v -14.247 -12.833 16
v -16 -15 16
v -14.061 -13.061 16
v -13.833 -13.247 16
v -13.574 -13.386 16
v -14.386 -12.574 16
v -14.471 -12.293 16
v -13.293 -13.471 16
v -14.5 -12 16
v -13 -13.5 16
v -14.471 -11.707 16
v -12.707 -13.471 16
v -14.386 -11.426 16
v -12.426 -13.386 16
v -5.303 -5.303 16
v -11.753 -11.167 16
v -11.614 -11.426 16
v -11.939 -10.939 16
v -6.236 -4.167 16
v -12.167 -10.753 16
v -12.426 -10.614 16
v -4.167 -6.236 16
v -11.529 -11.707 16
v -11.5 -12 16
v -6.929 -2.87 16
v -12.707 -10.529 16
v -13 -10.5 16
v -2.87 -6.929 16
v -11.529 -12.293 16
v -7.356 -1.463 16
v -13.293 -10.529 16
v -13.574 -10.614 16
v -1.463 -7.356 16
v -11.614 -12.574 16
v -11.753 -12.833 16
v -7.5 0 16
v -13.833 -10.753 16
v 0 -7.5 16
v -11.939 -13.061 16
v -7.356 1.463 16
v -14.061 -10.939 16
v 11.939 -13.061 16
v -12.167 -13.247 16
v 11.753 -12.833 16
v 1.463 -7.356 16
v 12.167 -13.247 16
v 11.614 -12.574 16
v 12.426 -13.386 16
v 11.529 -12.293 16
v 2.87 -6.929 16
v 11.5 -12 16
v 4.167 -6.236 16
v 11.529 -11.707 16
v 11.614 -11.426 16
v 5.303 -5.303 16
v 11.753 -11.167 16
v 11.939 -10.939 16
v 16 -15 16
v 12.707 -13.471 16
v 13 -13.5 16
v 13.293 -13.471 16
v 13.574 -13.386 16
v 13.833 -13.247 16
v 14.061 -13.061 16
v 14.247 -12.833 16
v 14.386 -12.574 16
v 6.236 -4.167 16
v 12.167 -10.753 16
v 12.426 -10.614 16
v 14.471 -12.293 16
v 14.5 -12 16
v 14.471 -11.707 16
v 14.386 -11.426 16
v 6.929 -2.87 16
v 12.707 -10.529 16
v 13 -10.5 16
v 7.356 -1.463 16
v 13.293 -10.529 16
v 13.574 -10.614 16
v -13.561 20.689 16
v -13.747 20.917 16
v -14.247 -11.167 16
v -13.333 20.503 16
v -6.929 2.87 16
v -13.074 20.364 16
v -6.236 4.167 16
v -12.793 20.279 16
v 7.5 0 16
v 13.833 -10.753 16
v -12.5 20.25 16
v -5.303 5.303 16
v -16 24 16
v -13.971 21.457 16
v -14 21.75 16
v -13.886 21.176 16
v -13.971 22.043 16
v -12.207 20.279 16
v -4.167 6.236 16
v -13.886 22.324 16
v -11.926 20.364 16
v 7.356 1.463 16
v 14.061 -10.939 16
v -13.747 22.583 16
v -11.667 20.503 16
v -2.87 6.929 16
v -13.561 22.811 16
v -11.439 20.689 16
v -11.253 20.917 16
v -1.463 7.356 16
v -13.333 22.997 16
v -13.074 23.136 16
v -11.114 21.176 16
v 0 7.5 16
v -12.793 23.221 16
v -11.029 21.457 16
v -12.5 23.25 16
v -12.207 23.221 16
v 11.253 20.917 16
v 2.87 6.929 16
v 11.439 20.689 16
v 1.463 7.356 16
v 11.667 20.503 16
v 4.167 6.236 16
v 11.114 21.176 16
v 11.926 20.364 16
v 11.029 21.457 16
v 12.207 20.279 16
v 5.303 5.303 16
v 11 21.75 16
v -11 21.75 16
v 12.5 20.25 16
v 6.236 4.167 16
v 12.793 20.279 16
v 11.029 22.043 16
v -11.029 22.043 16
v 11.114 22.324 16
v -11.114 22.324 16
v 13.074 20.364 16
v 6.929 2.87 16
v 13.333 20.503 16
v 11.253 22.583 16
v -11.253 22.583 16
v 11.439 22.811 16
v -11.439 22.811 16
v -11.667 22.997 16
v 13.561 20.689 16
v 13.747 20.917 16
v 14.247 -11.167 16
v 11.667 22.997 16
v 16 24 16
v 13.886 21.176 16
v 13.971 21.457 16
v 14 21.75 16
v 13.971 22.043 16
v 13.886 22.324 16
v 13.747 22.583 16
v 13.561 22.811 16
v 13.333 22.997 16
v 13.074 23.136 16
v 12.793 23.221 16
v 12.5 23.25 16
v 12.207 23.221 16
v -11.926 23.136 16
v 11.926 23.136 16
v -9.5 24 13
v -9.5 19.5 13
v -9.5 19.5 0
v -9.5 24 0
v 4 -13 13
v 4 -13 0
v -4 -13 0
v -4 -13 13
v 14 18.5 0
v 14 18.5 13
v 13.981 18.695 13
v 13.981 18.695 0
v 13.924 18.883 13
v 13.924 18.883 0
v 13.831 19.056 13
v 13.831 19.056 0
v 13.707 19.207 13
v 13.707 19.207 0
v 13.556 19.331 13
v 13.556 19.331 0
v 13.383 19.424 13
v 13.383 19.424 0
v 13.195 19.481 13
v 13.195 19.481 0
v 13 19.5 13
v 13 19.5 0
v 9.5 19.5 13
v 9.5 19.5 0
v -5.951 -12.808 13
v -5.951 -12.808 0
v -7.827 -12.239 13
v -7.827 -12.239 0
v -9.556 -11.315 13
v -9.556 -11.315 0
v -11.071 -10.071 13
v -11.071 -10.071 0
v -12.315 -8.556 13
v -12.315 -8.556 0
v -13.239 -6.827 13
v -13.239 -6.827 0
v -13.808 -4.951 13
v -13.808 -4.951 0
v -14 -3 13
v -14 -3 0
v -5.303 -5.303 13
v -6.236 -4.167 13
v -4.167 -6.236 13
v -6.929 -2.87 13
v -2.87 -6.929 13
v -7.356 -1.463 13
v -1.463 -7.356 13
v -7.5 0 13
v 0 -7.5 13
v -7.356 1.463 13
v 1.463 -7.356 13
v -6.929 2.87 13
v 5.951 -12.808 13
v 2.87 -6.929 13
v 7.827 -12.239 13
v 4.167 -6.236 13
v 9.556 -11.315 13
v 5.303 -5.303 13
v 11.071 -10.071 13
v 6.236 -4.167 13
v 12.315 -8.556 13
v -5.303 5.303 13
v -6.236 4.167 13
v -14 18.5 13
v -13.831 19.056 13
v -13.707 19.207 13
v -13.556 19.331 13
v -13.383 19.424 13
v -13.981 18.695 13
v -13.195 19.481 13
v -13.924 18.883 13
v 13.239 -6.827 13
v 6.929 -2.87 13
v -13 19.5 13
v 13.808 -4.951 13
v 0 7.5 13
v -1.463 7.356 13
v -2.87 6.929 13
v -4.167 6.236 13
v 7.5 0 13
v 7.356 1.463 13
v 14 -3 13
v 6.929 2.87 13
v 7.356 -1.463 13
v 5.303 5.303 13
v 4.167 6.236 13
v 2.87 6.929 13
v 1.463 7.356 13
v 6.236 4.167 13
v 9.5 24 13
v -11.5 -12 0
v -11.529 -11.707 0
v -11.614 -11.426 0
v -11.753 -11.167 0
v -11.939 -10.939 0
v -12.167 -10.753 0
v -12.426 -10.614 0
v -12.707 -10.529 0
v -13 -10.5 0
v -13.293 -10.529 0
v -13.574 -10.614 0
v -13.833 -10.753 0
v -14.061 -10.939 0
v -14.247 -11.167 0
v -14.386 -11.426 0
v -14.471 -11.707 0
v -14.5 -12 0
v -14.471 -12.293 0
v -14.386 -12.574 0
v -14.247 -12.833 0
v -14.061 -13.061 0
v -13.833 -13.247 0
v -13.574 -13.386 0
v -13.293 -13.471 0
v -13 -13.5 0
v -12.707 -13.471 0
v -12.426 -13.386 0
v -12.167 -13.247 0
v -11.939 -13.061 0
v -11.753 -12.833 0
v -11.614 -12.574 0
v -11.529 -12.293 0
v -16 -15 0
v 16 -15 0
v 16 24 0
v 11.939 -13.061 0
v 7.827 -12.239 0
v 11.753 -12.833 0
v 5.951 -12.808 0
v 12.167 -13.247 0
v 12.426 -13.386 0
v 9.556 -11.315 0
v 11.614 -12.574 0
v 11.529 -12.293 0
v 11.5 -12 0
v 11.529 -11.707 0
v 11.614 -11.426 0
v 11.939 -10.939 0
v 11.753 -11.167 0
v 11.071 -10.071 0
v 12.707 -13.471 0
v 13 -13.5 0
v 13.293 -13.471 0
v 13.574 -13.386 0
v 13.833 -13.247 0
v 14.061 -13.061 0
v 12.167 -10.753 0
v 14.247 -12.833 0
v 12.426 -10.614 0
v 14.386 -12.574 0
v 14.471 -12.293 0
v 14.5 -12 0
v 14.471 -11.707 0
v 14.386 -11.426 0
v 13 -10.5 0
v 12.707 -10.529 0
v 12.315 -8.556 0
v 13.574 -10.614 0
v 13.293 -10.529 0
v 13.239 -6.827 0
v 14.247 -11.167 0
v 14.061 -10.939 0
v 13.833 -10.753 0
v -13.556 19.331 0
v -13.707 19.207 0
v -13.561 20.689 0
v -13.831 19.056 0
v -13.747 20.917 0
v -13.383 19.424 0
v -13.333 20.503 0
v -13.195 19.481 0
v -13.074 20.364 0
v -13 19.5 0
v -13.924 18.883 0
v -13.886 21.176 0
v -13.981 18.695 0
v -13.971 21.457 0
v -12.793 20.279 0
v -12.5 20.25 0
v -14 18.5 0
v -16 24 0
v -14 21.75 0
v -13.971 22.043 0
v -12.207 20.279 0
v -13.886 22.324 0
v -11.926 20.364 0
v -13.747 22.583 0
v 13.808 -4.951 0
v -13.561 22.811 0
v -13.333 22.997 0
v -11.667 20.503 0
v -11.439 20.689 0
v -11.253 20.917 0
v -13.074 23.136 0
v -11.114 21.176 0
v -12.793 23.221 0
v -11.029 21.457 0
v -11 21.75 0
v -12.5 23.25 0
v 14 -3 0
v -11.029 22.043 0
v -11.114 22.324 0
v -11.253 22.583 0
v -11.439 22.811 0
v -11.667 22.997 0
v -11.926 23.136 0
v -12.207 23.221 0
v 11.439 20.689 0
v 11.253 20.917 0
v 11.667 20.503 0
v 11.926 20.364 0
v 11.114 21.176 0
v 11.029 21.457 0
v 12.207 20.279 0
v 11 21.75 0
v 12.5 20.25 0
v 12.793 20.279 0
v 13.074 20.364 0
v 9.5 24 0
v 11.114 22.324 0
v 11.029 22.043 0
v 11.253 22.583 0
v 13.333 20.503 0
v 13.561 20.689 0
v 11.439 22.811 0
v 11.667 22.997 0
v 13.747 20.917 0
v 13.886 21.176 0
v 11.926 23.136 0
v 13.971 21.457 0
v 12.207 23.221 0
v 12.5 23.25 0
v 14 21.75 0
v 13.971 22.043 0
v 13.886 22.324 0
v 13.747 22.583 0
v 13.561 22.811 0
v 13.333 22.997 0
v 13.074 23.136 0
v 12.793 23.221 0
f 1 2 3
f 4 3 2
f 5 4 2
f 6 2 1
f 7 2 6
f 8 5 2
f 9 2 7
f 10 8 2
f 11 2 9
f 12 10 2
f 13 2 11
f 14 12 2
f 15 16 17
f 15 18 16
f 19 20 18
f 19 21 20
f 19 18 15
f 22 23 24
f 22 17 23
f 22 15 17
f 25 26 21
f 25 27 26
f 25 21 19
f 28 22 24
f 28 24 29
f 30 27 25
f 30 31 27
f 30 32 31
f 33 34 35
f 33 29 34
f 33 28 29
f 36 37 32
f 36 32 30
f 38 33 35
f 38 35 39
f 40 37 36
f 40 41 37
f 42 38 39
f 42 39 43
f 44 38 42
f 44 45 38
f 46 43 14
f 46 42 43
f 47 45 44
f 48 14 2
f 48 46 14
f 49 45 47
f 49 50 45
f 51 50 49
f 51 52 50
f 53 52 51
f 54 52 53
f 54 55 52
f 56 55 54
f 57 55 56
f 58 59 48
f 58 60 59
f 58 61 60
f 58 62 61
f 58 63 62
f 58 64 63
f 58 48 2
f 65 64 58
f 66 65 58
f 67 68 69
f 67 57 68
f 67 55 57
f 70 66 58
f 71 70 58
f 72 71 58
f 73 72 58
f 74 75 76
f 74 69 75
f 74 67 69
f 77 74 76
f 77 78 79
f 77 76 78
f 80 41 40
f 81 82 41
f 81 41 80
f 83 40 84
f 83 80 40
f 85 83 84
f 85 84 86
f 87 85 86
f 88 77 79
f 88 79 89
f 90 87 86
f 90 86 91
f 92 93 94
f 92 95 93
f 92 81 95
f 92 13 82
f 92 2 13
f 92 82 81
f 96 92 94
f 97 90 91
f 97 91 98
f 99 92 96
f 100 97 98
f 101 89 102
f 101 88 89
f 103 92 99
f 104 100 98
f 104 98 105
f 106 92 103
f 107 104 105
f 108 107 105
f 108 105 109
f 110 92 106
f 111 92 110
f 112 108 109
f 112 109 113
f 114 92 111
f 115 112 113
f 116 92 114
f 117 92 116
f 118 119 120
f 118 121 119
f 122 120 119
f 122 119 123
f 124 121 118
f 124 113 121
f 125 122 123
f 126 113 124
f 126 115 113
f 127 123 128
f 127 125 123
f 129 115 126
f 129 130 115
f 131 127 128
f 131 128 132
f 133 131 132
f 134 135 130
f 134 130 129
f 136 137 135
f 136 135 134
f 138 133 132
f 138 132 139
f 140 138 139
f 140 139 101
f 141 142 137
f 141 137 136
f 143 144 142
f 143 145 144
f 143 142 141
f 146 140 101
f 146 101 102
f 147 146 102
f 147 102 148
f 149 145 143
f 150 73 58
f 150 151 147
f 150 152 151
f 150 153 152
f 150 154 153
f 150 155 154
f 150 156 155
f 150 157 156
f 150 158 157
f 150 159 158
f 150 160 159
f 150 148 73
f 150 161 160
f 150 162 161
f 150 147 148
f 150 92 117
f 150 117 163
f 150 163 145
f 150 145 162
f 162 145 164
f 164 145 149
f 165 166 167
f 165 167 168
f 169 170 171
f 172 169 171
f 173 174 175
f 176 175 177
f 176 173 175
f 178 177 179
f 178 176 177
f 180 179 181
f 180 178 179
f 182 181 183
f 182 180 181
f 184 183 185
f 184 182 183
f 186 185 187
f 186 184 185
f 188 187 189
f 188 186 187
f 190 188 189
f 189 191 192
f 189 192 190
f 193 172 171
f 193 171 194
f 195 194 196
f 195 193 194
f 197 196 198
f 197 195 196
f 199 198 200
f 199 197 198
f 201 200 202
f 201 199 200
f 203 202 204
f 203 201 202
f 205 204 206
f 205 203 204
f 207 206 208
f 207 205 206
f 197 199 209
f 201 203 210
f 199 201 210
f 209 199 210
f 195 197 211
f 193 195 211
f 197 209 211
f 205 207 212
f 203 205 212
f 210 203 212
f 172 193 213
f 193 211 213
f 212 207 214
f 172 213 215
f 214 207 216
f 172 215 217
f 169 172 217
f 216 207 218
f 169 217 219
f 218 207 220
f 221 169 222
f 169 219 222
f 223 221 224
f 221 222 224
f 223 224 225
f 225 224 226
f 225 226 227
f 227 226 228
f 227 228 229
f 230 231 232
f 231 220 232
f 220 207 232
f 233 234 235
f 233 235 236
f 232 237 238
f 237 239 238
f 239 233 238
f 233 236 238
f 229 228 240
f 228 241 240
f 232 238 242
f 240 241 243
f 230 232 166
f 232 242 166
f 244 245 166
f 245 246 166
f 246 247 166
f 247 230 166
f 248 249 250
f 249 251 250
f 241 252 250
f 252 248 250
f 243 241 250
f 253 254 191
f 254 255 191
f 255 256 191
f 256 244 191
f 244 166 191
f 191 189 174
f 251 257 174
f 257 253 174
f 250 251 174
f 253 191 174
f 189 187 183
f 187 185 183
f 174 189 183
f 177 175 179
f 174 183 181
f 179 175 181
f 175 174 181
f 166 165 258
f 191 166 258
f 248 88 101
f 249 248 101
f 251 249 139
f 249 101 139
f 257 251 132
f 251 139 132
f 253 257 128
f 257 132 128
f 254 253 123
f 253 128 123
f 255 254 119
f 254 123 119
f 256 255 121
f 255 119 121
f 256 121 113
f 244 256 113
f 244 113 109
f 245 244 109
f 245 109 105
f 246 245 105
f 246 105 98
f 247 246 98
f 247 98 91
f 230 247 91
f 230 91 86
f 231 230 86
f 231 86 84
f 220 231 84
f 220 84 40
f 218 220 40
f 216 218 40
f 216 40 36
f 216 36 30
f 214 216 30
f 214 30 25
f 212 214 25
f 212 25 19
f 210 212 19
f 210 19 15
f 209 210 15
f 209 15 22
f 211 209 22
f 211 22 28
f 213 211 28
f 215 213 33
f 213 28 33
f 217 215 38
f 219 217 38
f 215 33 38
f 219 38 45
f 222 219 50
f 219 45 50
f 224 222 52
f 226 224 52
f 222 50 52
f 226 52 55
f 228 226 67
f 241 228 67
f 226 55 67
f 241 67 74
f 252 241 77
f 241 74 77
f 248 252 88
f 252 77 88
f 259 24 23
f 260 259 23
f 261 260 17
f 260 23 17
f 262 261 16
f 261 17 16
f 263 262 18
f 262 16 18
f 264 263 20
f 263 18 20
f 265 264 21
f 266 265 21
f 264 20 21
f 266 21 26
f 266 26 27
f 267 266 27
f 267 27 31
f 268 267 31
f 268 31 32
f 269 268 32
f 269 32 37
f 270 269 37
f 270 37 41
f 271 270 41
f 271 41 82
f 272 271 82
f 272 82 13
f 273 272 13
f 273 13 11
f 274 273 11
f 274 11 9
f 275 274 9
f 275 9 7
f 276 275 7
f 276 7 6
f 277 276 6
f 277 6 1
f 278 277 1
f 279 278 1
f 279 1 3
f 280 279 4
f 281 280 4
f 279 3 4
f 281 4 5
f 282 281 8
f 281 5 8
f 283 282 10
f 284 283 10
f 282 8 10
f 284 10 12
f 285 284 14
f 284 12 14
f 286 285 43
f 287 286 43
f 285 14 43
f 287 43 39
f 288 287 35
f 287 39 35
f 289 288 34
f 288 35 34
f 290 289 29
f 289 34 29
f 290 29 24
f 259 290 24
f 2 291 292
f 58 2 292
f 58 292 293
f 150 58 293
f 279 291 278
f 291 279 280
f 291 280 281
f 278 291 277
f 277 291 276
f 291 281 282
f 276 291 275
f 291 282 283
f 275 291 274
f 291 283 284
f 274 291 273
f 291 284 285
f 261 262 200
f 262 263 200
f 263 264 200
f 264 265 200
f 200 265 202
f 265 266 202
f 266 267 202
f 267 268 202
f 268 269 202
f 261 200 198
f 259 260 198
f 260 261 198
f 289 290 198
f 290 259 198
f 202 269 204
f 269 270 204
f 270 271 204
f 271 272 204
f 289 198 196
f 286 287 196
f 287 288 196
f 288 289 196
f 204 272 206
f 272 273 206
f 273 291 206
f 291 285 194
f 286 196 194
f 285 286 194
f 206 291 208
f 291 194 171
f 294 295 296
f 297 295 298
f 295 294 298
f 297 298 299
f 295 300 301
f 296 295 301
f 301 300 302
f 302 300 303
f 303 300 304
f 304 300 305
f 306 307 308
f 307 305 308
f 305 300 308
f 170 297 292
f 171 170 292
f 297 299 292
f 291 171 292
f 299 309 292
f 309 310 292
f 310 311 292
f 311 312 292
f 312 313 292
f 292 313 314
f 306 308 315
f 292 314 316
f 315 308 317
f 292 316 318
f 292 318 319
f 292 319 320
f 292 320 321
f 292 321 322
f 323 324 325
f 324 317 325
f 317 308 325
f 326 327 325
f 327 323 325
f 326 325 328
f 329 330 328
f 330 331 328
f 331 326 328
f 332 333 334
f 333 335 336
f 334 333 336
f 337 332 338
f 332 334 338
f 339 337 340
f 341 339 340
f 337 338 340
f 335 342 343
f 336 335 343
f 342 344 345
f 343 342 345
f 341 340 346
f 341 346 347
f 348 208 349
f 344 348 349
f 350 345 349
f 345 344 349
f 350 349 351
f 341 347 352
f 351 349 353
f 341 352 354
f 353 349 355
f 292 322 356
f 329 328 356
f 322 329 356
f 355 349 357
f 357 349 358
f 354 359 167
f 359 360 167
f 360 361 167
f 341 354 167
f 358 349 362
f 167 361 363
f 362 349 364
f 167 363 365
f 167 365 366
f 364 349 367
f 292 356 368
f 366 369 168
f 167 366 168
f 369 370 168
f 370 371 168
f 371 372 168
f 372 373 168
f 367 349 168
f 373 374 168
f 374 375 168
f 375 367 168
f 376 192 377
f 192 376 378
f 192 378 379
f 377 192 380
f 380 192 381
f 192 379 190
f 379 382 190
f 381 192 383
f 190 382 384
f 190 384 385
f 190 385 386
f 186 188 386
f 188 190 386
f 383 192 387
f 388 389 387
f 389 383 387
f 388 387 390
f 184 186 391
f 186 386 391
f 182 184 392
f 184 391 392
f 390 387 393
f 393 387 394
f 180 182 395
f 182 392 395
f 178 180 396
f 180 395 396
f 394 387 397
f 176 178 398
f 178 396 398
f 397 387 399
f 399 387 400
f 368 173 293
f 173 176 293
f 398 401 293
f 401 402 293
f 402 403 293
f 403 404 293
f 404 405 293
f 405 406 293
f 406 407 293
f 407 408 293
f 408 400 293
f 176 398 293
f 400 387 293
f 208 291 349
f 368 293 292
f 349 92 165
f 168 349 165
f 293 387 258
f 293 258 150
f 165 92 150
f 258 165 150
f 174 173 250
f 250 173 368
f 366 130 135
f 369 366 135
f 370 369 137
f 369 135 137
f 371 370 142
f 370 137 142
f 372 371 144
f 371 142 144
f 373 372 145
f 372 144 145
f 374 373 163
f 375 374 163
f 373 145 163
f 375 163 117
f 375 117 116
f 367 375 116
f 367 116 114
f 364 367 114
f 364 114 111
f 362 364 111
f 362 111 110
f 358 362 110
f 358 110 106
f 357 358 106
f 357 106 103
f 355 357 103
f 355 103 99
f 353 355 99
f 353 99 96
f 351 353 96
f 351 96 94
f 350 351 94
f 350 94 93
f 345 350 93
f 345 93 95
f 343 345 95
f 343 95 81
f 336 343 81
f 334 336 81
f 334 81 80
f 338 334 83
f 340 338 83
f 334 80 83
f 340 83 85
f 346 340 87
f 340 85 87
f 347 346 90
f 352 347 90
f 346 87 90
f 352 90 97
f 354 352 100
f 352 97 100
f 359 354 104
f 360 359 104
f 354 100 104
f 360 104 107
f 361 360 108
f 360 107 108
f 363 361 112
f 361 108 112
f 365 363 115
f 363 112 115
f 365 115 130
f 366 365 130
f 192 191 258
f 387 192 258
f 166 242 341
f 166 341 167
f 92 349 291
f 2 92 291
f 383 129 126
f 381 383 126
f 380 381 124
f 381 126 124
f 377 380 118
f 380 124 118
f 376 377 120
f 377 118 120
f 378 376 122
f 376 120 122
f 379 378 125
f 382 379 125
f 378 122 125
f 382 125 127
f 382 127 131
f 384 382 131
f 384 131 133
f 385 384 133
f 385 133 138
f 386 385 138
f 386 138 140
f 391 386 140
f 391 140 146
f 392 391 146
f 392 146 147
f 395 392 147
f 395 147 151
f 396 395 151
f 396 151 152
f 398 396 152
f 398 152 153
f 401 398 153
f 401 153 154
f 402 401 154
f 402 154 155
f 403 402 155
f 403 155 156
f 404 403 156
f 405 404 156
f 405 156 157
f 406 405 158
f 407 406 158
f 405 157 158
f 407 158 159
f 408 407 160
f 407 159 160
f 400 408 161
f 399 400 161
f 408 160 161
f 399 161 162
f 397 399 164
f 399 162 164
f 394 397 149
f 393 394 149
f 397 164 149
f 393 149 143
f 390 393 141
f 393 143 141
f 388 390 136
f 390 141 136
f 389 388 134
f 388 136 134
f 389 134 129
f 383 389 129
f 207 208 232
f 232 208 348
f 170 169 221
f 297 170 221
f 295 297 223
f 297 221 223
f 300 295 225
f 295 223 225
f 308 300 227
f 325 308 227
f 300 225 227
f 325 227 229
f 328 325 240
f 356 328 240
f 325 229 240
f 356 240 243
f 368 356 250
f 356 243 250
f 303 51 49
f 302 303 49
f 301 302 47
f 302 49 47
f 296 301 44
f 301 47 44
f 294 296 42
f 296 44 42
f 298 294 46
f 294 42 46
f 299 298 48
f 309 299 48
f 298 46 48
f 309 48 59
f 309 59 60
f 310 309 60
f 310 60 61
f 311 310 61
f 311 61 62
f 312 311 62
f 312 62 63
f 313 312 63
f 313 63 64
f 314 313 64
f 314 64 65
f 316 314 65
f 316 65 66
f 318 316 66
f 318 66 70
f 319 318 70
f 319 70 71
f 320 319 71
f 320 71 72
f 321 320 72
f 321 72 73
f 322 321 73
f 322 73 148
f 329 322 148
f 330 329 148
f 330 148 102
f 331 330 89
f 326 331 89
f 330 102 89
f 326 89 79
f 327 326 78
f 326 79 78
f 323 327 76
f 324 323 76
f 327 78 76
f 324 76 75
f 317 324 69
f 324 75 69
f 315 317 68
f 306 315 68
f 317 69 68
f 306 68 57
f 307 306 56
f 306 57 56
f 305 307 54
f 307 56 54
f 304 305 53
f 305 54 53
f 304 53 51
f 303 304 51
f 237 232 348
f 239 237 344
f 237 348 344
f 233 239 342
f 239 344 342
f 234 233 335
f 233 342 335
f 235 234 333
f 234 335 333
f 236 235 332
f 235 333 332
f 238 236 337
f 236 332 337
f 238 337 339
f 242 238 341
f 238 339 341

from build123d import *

# Parameters (mm, degrees)
BOSS_EXTRUDE1_DEPTH = 19
SKETCH2_W           = 4.5
SKETCH2_H           = 4.5
BOSS_EXTRUDE2_DEPTH = 19
FILLET1_R           = 10
FILLET2_R           = 10
FILLET3_R           = 1
SKETCH3_R           = 1.5
CUT_EXTRUDE1_DEPTH  = 19
SKETCH4_W           = 32
SKETCH4_H           = 3
CUT_EXTRUDE2_DEPTH  = 47.238512087
SKETCH5_W           = 32
SKETCH5_H           = 39
SKETCH5_R           = 1.5
BOSS_EXTRUDE3_DEPTH = 3
SKETCH6_R           = 7.5
CUT_EXTRUDE3_DEPTH  = 33.984845005


with BuildPart() as part:
    # Sketch1 → Boss-Extrude1 (new body)
    with BuildSketch(Plane.XY):
        with BuildLine():
            Line((-16, 24), (-16, 0))
            ThreePointArc((-16, 0), (-15.491933385, 4), (-14, 7.745966692))
            Line((-14, 7.745966692), (-14, 22))
            Line((-14, 22), (-14, 24))
            Line((-14, 24), (-16, 24))
        make_face()
        with BuildLine():
            ThreePointArc((-14, 7.745966692), (-15.491933385, 4), (-16, 0))
            ThreePointArc((-16, 0), (-15.491933385, -4), (-14, -7.745966692))
            Line((-14, -7.745966692), (-14, 0))
            Line((-14, 0), (-14, 7.745966692))
        make_face()
        with BuildLine():
            ThreePointArc((-14, -7.745966692), (-15.491933385, -4), (-16, 0))
            Line((-16, 0), (-16, -15))
            Line((-16, -15), (-5.567764363, -15))
            ThreePointArc((-5.567764363, -15), (-7.514407784, -14.125638947), (-9.327379053, -13))
            Line((-9.327379053, -13), (-14, -13))
            Line((-14, -13), (-14, -7.745966692))
        make_face()
        with BuildLine():
            ThreePointArc((-9.327379053, -13), (-7.514407784, -14.125638947), (-5.567764363, -15))
            Line((-5.567764363, -15), (5.567764363, -15))
            ThreePointArc((5.567764363, -15), (7.514407784, -14.125638947), (9.327379053, -13))
            Line((9.327379053, -13), (5.196152423, -13))
            ThreePointArc((5.196152423, -13), (0, -14), (-5.196152423, -13))
            Line((-5.196152423, -13), (-9.327379053, -13))
        make_face()
        with BuildLine():
            Line((5.196152423, -13), (-5.196152423, -13))
            ThreePointArc((-5.196152423, -13), (0, -14), (5.196152423, -13))
        make_face()
        with BuildLine():
            ThreePointArc((9.327379053, -13), (7.514407784, -14.125638947), (5.567764363, -15))
            Line((5.567764363, -15), (16, -15))
            Line((16, -15), (16, 0))
            ThreePointArc((16, 0), (15.491933385, -4), (14, -7.745966692))
            Line((14, -7.745966692), (14, -13))
            Line((14, -13), (9.327379053, -13))
        make_face()
        with BuildLine():
            ThreePointArc((16, 0), (15.491933385, 4), (14, 7.745966692))
            Line((14, 7.745966692), (14, 0))
            Line((14, 0), (14, -7.745966692))
            ThreePointArc((14, -7.745966692), (15.491933385, -4), (16, 0))
        make_face()
        with BuildLine():
            Line((14, 22), (14, 7.745966692))
            ThreePointArc((14, 7.745966692), (15.491933385, 4), (16, 0))
            Line((16, 0), (16, 24))
            Line((16, 24), (14, 24))
            Line((14, 24), (14, 22))
        make_face()
    extrude(amount=BOSS_EXTRUDE1_DEPTH)

    # Sketch2 → Boss-Extrude2 (add)
    with BuildSketch(Plane.XY.offset(19)):
        with Locations((-11.75, 21.75)):
            Rectangle(SKETCH2_W, SKETCH2_H)
        with Locations((11.75, 21.75)):
            Rectangle(SKETCH2_W, SKETCH2_H)
    extrude(amount=-BOSS_EXTRUDE2_DEPTH)

    # Fillet1
    fillet1_edges = [part.edges().sort_by_distance(p)[0] for p in [
        (-14, -13, 9.5),
    ]]
    fillet(fillet1_edges, radius=FILLET1_R)

    # Fillet2
    fillet2_edges = [part.edges().sort_by_distance(p)[0] for p in [
        (14, -13, 9.5),
    ]]
    fillet(fillet2_edges, radius=FILLET2_R)

    # Fillet3
    fillet3_edges = [part.edges().sort_by_distance(p)[0] for p in [
        (-14, 19.5, 9.5),
        (14, 19.5, 9.5),
    ]]
    fillet(fillet3_edges, radius=FILLET3_R)

    # Sketch3 → Cut-Extrude1 (cut)
    with BuildSketch(Plane.XY.offset(19)):
        with Locations((-12.5, 21.75)):
            Circle(SKETCH3_R)
        with Locations((-13, -12)):
            Circle(SKETCH3_R)
        with Locations(Location((12.5, 21.75, 0), (0, 0, 180))):
            Circle(SKETCH3_R)
        with Locations(Location((13, -12, 0), (0, 0, 180))):
            Circle(SKETCH3_R)
    extrude(amount=-CUT_EXTRUDE1_DEPTH, mode=Mode.SUBTRACT)

    # Sketch4 → Cut-Extrude2 (cut, through all)
    with BuildSketch(Plane(origin=(0, 24, 0), x_dir=(1, 0, 0), z_dir=(0, 1, 0))):
        with Locations((0, -17.5)):
            Rectangle(SKETCH4_W, SKETCH4_H)
    extrude(amount=-CUT_EXTRUDE2_DEPTH, mode=Mode.SUBTRACT)

    # Sketch5 → Boss-Extrude3 (add)
    with BuildSketch(Plane.XY.offset(16)):
        with Locations((0, 4.5)):
            Rectangle(SKETCH5_W, SKETCH5_H)
        with Locations((-12.5, 21.75)):
            Circle(SKETCH5_R, mode=Mode.SUBTRACT)
        with Locations(Location((12.5, 21.75, 0), (0, 0, 180))):
            Circle(SKETCH5_R, mode=Mode.SUBTRACT)
        with Locations((-13, -12)):
            Circle(SKETCH5_R, mode=Mode.SUBTRACT)
        with Locations(Location((13, -12, 0), (0, 0, 180))):
            Circle(SKETCH5_R, mode=Mode.SUBTRACT)
    extrude(amount=-BOSS_EXTRUDE3_DEPTH)

    # Sketch6 → Cut-Extrude3 (cut, through all)
    with BuildSketch(Plane.XY.offset(16)):
        Circle(SKETCH6_R)
    extrude(amount=-CUT_EXTRUDE3_DEPTH, mode=Mode.SUBTRACT)


solid = part.part
